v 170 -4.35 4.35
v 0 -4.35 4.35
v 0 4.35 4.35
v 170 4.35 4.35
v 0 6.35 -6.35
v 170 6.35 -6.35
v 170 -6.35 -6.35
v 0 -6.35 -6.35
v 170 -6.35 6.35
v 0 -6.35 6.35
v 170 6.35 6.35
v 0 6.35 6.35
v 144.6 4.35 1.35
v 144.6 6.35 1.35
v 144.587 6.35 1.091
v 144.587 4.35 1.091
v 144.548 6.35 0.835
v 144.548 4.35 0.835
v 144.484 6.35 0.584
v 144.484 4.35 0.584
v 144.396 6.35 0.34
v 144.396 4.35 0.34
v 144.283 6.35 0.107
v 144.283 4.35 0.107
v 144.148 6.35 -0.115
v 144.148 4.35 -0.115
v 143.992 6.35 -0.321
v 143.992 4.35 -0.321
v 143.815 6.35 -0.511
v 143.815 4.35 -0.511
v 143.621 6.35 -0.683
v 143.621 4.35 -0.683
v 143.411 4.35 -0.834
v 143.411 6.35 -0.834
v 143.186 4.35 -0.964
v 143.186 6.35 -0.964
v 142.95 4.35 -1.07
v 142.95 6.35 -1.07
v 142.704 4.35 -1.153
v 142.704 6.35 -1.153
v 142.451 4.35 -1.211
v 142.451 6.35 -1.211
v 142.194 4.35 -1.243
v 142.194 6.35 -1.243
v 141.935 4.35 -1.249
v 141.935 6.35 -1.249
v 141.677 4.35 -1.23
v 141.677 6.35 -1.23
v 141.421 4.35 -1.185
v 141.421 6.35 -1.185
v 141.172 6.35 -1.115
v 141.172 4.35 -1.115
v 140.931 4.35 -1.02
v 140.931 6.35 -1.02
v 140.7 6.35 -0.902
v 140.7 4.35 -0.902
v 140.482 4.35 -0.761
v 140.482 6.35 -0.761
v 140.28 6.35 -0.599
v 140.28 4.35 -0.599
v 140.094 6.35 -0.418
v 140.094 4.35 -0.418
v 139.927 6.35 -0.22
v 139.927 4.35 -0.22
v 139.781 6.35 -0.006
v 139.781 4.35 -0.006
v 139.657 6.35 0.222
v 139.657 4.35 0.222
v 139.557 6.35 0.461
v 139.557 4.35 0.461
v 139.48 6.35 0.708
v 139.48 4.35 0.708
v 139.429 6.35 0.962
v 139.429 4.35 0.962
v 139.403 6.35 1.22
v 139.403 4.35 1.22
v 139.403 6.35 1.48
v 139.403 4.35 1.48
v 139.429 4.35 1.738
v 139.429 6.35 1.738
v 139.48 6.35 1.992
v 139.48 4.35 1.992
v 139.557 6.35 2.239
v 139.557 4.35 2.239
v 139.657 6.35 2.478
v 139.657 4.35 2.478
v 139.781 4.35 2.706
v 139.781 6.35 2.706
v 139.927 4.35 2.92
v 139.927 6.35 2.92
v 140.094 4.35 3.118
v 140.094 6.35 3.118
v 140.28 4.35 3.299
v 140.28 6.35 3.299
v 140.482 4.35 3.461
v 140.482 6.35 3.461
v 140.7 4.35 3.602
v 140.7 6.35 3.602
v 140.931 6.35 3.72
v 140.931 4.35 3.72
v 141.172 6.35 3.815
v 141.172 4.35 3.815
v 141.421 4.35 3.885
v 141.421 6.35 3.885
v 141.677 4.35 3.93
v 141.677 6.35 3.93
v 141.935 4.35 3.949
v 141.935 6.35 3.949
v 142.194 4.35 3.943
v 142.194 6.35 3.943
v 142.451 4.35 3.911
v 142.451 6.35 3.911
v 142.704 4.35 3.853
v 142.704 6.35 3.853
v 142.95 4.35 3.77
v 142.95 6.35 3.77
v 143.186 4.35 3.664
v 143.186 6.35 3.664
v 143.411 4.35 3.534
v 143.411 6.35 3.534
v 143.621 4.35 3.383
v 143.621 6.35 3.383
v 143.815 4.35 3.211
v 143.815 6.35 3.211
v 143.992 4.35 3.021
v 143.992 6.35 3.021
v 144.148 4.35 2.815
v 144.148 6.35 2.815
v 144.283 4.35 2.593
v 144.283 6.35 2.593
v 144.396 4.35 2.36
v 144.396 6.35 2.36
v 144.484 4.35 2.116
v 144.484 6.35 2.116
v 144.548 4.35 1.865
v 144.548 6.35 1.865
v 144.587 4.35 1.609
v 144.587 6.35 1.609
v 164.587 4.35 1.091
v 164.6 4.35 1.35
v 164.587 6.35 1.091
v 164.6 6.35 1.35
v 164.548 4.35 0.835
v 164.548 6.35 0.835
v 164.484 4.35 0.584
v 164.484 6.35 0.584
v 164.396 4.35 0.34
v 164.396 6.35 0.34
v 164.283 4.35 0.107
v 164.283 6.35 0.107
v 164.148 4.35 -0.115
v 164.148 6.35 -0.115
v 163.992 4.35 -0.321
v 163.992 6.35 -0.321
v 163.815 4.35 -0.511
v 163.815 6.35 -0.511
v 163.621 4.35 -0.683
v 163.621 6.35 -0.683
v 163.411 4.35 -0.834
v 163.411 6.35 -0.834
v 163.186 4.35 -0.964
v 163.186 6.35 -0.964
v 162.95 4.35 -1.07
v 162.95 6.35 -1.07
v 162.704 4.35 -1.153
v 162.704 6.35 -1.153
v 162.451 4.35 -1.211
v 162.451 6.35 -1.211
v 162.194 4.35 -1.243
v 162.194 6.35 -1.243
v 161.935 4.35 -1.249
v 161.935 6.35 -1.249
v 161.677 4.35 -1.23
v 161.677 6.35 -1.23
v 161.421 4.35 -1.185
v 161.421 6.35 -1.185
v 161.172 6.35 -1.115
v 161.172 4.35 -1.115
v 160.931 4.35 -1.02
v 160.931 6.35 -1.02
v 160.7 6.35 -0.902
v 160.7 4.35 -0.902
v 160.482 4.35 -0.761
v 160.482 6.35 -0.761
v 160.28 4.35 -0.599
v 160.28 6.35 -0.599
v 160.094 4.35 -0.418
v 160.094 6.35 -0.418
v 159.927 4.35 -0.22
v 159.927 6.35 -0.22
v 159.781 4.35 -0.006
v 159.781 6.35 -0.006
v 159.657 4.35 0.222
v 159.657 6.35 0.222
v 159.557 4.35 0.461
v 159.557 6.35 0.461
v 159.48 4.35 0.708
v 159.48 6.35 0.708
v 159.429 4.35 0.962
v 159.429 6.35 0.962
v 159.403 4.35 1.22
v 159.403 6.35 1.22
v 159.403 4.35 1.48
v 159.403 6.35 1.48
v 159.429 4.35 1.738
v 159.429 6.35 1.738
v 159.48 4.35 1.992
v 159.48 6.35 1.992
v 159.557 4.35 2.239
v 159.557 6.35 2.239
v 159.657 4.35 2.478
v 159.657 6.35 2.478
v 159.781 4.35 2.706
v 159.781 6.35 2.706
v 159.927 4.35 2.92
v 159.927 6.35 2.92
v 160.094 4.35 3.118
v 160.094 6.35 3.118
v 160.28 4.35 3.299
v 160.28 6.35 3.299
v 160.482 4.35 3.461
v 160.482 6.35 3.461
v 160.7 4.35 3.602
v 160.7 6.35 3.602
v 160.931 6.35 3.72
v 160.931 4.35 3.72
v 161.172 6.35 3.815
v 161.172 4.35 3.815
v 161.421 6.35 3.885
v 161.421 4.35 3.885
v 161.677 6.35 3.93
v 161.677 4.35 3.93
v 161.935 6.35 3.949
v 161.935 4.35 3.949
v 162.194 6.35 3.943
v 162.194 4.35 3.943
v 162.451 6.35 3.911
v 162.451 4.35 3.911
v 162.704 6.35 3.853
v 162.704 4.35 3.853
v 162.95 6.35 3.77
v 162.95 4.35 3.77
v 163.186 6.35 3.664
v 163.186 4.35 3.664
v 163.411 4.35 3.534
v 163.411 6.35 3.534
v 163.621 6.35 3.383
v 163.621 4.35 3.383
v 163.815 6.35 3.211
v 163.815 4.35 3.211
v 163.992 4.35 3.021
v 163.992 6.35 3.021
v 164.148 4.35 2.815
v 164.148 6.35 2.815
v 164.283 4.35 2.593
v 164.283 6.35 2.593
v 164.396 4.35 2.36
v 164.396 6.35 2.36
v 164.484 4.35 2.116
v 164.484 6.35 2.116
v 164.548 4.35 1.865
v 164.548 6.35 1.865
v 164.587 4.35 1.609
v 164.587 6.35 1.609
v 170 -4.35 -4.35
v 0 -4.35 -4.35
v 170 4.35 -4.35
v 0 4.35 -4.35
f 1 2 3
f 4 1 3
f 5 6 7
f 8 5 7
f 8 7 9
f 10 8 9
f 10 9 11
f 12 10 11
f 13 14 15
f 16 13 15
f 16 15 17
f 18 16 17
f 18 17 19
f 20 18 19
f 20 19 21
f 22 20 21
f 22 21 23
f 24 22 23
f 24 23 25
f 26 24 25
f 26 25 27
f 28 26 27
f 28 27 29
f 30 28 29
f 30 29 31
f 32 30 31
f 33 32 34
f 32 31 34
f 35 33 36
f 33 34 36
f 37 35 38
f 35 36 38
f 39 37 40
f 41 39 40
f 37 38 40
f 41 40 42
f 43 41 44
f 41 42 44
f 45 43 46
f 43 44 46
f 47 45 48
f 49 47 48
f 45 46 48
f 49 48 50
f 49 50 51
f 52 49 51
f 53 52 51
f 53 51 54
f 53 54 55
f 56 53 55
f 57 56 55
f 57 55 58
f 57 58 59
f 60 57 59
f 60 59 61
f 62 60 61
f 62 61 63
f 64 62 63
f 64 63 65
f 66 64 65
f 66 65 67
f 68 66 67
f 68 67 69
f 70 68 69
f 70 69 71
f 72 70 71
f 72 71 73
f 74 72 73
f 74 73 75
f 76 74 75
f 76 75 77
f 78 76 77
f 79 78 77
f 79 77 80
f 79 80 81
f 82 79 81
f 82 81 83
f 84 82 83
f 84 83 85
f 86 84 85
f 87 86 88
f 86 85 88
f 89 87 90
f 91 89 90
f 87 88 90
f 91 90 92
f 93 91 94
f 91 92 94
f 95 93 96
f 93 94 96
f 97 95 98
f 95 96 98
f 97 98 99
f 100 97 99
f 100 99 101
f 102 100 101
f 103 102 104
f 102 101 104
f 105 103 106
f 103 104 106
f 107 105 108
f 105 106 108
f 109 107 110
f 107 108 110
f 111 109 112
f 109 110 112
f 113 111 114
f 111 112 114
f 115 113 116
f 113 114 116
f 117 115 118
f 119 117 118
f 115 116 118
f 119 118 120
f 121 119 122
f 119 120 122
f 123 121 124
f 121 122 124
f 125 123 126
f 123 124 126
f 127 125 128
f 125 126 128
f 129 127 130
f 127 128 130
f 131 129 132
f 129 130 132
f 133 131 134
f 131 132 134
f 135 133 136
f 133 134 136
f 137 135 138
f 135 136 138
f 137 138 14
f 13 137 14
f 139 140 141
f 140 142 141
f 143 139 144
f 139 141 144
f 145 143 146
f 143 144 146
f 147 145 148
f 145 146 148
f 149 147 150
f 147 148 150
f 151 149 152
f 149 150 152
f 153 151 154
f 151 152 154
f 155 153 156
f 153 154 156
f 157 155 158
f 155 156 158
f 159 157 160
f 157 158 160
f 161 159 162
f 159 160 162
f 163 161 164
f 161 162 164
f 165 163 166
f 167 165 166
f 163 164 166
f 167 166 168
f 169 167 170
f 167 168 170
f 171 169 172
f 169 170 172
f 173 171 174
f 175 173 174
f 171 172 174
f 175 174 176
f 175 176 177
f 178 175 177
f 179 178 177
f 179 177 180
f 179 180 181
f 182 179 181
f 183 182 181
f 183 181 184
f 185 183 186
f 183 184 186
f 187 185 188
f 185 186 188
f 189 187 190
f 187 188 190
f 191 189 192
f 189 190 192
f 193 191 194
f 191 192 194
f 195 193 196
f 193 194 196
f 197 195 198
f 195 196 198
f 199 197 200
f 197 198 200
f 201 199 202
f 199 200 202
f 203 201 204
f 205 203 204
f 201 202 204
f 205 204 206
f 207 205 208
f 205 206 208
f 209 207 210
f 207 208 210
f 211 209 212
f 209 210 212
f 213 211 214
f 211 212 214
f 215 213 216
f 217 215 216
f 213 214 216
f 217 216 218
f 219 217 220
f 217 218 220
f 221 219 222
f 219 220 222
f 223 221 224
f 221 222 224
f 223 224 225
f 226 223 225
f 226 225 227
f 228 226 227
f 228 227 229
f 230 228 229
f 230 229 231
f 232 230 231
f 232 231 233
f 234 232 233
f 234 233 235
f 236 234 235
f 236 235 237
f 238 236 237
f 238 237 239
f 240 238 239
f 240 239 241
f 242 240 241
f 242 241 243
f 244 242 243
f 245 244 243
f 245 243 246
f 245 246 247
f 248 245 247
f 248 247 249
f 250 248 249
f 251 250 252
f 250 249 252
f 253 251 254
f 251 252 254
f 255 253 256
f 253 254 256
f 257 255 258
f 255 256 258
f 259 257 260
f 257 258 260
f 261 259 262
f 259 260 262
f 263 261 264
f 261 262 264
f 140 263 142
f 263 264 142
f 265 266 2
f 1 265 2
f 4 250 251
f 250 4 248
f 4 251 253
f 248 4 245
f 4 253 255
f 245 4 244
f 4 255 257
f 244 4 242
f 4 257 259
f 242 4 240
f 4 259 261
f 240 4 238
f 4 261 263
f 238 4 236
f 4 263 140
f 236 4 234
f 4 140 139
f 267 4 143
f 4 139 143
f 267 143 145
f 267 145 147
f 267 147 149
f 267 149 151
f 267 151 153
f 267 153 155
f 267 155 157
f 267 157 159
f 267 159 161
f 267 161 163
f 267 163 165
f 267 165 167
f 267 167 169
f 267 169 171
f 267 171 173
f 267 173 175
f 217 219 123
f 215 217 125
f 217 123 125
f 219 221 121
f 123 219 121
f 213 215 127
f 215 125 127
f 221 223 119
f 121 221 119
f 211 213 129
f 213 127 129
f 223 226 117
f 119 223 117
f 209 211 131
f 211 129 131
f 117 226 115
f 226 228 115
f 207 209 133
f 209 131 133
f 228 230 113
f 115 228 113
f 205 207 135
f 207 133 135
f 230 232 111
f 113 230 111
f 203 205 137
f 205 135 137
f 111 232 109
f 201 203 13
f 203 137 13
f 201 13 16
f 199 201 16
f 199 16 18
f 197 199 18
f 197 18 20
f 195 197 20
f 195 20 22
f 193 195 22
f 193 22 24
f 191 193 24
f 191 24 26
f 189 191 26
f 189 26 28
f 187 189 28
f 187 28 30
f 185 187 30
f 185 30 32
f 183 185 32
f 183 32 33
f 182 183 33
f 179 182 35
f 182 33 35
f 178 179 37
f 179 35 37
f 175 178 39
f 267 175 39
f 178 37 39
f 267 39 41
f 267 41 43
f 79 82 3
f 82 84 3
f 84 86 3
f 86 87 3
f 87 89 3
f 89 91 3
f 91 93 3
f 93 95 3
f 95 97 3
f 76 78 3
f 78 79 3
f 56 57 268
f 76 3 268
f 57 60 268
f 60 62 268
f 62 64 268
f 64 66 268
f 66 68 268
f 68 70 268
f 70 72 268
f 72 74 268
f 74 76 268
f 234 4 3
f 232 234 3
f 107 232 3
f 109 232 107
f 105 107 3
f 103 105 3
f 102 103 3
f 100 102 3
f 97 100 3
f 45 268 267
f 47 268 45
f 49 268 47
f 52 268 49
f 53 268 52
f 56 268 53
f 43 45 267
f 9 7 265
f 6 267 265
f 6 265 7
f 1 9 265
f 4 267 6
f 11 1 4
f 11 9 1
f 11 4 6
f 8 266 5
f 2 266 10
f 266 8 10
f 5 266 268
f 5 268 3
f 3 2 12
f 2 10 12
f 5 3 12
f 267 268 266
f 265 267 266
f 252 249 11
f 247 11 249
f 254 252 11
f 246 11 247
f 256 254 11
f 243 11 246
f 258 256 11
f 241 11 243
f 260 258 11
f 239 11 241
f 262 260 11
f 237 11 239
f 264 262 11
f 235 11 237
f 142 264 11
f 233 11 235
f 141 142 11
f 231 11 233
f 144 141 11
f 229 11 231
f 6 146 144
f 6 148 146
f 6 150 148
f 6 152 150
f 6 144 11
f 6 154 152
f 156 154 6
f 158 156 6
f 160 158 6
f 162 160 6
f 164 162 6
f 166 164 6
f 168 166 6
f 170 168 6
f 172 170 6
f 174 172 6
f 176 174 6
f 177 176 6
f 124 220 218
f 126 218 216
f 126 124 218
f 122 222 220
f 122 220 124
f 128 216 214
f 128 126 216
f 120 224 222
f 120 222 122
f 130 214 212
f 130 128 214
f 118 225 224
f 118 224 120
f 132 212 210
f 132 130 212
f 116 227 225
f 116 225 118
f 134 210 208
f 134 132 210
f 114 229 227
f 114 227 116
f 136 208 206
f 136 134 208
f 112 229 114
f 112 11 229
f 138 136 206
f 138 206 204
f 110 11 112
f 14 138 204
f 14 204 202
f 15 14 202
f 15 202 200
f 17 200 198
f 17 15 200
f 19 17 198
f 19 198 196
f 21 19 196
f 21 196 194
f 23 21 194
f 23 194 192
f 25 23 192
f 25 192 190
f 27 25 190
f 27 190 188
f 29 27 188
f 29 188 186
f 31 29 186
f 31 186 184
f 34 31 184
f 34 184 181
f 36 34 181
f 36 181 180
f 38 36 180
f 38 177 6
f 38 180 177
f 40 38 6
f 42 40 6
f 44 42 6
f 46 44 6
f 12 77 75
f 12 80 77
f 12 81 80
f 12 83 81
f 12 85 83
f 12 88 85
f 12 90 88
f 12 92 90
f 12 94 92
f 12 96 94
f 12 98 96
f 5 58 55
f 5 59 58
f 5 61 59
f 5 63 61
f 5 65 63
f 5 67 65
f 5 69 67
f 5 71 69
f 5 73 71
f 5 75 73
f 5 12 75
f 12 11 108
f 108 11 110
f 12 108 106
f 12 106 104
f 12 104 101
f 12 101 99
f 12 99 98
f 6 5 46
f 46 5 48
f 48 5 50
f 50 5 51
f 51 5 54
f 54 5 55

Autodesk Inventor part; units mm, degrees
ref_plane "YZ Plane" through (0, 0, 0) normal (1, 0, 0) x (0, 1, 0)
ref_plane "XZ Plane" through (0, 0, 0) normal (0, 1, 0) x (-1, 0, 0)
ref_plane "XY Plane" through (0, 0, 0) normal (0, 0, 1) x (1, 0, 0)
sketch "Sketch1" plane through (0, 0, 0) normal (1, 0, 0) x (0, 1, 0)
  line L0 (-6.35, 6.35) -> (6.35, 6.35)
  line L1 (6.35, 6.35) -> (6.35, -6.35)
  line L2 (6.35, -6.35) -> (-6.35, -6.35)
  line L3 (-6.35, -6.35) -> (-6.35, 6.35)
  line L4 (-6.35, 6.35) -> (6.35, -6.35) construction
  line L5 (6.35, 6.35) -> (-6.35, -6.35) construction
  line L6 (-4.35, 4.35) -> (4.35, 4.35)
  line L7 (4.35, 4.35) -> (4.35, -4.35)
  line L8 (4.35, -4.35) -> (-4.35, -4.35)
  line L9 (-4.35, -4.35) -> (-4.35, 4.35)
  line L10 (-4.35, 4.35) -> (4.35, -4.35) construction
  line L11 (4.35, 4.35) -> (-4.35, -4.35) construction
  point P0 (0, 0)
  dimension "d0" = 12.7
  dimension "d1" = 12.7
  dimension "d13" = 2
  dimension "d14" = 2
extrude "Extrusion1" add sketch "Sketch1" along normal blind 170
sketch "Sketch2" plane through (0, 6.35, 6.35) normal (0, 1, 0) x (1, 0, 0)
  circle A0 centre (162, 5) radius 2.6
  line L0 (170, 12.7) -> (170, 0) projected
  circle A1 centre (142, 5) radius 2.6
  line L1 (0, 0) -> (170, 0) projected
  point P0 (0, 6.35)
  dimension "d8" = 5.2
  dimension "d9" = 8
  dimension "d10" = 5.2
  dimension "d11" = 20
  dimension "d12" = 5
extrude "Extrusion2" cut sketch "Sketch2" against normal blind 10
equation "\"d1\" = d0"
equation "\"d14\" = d13"
properties part number "arm"
